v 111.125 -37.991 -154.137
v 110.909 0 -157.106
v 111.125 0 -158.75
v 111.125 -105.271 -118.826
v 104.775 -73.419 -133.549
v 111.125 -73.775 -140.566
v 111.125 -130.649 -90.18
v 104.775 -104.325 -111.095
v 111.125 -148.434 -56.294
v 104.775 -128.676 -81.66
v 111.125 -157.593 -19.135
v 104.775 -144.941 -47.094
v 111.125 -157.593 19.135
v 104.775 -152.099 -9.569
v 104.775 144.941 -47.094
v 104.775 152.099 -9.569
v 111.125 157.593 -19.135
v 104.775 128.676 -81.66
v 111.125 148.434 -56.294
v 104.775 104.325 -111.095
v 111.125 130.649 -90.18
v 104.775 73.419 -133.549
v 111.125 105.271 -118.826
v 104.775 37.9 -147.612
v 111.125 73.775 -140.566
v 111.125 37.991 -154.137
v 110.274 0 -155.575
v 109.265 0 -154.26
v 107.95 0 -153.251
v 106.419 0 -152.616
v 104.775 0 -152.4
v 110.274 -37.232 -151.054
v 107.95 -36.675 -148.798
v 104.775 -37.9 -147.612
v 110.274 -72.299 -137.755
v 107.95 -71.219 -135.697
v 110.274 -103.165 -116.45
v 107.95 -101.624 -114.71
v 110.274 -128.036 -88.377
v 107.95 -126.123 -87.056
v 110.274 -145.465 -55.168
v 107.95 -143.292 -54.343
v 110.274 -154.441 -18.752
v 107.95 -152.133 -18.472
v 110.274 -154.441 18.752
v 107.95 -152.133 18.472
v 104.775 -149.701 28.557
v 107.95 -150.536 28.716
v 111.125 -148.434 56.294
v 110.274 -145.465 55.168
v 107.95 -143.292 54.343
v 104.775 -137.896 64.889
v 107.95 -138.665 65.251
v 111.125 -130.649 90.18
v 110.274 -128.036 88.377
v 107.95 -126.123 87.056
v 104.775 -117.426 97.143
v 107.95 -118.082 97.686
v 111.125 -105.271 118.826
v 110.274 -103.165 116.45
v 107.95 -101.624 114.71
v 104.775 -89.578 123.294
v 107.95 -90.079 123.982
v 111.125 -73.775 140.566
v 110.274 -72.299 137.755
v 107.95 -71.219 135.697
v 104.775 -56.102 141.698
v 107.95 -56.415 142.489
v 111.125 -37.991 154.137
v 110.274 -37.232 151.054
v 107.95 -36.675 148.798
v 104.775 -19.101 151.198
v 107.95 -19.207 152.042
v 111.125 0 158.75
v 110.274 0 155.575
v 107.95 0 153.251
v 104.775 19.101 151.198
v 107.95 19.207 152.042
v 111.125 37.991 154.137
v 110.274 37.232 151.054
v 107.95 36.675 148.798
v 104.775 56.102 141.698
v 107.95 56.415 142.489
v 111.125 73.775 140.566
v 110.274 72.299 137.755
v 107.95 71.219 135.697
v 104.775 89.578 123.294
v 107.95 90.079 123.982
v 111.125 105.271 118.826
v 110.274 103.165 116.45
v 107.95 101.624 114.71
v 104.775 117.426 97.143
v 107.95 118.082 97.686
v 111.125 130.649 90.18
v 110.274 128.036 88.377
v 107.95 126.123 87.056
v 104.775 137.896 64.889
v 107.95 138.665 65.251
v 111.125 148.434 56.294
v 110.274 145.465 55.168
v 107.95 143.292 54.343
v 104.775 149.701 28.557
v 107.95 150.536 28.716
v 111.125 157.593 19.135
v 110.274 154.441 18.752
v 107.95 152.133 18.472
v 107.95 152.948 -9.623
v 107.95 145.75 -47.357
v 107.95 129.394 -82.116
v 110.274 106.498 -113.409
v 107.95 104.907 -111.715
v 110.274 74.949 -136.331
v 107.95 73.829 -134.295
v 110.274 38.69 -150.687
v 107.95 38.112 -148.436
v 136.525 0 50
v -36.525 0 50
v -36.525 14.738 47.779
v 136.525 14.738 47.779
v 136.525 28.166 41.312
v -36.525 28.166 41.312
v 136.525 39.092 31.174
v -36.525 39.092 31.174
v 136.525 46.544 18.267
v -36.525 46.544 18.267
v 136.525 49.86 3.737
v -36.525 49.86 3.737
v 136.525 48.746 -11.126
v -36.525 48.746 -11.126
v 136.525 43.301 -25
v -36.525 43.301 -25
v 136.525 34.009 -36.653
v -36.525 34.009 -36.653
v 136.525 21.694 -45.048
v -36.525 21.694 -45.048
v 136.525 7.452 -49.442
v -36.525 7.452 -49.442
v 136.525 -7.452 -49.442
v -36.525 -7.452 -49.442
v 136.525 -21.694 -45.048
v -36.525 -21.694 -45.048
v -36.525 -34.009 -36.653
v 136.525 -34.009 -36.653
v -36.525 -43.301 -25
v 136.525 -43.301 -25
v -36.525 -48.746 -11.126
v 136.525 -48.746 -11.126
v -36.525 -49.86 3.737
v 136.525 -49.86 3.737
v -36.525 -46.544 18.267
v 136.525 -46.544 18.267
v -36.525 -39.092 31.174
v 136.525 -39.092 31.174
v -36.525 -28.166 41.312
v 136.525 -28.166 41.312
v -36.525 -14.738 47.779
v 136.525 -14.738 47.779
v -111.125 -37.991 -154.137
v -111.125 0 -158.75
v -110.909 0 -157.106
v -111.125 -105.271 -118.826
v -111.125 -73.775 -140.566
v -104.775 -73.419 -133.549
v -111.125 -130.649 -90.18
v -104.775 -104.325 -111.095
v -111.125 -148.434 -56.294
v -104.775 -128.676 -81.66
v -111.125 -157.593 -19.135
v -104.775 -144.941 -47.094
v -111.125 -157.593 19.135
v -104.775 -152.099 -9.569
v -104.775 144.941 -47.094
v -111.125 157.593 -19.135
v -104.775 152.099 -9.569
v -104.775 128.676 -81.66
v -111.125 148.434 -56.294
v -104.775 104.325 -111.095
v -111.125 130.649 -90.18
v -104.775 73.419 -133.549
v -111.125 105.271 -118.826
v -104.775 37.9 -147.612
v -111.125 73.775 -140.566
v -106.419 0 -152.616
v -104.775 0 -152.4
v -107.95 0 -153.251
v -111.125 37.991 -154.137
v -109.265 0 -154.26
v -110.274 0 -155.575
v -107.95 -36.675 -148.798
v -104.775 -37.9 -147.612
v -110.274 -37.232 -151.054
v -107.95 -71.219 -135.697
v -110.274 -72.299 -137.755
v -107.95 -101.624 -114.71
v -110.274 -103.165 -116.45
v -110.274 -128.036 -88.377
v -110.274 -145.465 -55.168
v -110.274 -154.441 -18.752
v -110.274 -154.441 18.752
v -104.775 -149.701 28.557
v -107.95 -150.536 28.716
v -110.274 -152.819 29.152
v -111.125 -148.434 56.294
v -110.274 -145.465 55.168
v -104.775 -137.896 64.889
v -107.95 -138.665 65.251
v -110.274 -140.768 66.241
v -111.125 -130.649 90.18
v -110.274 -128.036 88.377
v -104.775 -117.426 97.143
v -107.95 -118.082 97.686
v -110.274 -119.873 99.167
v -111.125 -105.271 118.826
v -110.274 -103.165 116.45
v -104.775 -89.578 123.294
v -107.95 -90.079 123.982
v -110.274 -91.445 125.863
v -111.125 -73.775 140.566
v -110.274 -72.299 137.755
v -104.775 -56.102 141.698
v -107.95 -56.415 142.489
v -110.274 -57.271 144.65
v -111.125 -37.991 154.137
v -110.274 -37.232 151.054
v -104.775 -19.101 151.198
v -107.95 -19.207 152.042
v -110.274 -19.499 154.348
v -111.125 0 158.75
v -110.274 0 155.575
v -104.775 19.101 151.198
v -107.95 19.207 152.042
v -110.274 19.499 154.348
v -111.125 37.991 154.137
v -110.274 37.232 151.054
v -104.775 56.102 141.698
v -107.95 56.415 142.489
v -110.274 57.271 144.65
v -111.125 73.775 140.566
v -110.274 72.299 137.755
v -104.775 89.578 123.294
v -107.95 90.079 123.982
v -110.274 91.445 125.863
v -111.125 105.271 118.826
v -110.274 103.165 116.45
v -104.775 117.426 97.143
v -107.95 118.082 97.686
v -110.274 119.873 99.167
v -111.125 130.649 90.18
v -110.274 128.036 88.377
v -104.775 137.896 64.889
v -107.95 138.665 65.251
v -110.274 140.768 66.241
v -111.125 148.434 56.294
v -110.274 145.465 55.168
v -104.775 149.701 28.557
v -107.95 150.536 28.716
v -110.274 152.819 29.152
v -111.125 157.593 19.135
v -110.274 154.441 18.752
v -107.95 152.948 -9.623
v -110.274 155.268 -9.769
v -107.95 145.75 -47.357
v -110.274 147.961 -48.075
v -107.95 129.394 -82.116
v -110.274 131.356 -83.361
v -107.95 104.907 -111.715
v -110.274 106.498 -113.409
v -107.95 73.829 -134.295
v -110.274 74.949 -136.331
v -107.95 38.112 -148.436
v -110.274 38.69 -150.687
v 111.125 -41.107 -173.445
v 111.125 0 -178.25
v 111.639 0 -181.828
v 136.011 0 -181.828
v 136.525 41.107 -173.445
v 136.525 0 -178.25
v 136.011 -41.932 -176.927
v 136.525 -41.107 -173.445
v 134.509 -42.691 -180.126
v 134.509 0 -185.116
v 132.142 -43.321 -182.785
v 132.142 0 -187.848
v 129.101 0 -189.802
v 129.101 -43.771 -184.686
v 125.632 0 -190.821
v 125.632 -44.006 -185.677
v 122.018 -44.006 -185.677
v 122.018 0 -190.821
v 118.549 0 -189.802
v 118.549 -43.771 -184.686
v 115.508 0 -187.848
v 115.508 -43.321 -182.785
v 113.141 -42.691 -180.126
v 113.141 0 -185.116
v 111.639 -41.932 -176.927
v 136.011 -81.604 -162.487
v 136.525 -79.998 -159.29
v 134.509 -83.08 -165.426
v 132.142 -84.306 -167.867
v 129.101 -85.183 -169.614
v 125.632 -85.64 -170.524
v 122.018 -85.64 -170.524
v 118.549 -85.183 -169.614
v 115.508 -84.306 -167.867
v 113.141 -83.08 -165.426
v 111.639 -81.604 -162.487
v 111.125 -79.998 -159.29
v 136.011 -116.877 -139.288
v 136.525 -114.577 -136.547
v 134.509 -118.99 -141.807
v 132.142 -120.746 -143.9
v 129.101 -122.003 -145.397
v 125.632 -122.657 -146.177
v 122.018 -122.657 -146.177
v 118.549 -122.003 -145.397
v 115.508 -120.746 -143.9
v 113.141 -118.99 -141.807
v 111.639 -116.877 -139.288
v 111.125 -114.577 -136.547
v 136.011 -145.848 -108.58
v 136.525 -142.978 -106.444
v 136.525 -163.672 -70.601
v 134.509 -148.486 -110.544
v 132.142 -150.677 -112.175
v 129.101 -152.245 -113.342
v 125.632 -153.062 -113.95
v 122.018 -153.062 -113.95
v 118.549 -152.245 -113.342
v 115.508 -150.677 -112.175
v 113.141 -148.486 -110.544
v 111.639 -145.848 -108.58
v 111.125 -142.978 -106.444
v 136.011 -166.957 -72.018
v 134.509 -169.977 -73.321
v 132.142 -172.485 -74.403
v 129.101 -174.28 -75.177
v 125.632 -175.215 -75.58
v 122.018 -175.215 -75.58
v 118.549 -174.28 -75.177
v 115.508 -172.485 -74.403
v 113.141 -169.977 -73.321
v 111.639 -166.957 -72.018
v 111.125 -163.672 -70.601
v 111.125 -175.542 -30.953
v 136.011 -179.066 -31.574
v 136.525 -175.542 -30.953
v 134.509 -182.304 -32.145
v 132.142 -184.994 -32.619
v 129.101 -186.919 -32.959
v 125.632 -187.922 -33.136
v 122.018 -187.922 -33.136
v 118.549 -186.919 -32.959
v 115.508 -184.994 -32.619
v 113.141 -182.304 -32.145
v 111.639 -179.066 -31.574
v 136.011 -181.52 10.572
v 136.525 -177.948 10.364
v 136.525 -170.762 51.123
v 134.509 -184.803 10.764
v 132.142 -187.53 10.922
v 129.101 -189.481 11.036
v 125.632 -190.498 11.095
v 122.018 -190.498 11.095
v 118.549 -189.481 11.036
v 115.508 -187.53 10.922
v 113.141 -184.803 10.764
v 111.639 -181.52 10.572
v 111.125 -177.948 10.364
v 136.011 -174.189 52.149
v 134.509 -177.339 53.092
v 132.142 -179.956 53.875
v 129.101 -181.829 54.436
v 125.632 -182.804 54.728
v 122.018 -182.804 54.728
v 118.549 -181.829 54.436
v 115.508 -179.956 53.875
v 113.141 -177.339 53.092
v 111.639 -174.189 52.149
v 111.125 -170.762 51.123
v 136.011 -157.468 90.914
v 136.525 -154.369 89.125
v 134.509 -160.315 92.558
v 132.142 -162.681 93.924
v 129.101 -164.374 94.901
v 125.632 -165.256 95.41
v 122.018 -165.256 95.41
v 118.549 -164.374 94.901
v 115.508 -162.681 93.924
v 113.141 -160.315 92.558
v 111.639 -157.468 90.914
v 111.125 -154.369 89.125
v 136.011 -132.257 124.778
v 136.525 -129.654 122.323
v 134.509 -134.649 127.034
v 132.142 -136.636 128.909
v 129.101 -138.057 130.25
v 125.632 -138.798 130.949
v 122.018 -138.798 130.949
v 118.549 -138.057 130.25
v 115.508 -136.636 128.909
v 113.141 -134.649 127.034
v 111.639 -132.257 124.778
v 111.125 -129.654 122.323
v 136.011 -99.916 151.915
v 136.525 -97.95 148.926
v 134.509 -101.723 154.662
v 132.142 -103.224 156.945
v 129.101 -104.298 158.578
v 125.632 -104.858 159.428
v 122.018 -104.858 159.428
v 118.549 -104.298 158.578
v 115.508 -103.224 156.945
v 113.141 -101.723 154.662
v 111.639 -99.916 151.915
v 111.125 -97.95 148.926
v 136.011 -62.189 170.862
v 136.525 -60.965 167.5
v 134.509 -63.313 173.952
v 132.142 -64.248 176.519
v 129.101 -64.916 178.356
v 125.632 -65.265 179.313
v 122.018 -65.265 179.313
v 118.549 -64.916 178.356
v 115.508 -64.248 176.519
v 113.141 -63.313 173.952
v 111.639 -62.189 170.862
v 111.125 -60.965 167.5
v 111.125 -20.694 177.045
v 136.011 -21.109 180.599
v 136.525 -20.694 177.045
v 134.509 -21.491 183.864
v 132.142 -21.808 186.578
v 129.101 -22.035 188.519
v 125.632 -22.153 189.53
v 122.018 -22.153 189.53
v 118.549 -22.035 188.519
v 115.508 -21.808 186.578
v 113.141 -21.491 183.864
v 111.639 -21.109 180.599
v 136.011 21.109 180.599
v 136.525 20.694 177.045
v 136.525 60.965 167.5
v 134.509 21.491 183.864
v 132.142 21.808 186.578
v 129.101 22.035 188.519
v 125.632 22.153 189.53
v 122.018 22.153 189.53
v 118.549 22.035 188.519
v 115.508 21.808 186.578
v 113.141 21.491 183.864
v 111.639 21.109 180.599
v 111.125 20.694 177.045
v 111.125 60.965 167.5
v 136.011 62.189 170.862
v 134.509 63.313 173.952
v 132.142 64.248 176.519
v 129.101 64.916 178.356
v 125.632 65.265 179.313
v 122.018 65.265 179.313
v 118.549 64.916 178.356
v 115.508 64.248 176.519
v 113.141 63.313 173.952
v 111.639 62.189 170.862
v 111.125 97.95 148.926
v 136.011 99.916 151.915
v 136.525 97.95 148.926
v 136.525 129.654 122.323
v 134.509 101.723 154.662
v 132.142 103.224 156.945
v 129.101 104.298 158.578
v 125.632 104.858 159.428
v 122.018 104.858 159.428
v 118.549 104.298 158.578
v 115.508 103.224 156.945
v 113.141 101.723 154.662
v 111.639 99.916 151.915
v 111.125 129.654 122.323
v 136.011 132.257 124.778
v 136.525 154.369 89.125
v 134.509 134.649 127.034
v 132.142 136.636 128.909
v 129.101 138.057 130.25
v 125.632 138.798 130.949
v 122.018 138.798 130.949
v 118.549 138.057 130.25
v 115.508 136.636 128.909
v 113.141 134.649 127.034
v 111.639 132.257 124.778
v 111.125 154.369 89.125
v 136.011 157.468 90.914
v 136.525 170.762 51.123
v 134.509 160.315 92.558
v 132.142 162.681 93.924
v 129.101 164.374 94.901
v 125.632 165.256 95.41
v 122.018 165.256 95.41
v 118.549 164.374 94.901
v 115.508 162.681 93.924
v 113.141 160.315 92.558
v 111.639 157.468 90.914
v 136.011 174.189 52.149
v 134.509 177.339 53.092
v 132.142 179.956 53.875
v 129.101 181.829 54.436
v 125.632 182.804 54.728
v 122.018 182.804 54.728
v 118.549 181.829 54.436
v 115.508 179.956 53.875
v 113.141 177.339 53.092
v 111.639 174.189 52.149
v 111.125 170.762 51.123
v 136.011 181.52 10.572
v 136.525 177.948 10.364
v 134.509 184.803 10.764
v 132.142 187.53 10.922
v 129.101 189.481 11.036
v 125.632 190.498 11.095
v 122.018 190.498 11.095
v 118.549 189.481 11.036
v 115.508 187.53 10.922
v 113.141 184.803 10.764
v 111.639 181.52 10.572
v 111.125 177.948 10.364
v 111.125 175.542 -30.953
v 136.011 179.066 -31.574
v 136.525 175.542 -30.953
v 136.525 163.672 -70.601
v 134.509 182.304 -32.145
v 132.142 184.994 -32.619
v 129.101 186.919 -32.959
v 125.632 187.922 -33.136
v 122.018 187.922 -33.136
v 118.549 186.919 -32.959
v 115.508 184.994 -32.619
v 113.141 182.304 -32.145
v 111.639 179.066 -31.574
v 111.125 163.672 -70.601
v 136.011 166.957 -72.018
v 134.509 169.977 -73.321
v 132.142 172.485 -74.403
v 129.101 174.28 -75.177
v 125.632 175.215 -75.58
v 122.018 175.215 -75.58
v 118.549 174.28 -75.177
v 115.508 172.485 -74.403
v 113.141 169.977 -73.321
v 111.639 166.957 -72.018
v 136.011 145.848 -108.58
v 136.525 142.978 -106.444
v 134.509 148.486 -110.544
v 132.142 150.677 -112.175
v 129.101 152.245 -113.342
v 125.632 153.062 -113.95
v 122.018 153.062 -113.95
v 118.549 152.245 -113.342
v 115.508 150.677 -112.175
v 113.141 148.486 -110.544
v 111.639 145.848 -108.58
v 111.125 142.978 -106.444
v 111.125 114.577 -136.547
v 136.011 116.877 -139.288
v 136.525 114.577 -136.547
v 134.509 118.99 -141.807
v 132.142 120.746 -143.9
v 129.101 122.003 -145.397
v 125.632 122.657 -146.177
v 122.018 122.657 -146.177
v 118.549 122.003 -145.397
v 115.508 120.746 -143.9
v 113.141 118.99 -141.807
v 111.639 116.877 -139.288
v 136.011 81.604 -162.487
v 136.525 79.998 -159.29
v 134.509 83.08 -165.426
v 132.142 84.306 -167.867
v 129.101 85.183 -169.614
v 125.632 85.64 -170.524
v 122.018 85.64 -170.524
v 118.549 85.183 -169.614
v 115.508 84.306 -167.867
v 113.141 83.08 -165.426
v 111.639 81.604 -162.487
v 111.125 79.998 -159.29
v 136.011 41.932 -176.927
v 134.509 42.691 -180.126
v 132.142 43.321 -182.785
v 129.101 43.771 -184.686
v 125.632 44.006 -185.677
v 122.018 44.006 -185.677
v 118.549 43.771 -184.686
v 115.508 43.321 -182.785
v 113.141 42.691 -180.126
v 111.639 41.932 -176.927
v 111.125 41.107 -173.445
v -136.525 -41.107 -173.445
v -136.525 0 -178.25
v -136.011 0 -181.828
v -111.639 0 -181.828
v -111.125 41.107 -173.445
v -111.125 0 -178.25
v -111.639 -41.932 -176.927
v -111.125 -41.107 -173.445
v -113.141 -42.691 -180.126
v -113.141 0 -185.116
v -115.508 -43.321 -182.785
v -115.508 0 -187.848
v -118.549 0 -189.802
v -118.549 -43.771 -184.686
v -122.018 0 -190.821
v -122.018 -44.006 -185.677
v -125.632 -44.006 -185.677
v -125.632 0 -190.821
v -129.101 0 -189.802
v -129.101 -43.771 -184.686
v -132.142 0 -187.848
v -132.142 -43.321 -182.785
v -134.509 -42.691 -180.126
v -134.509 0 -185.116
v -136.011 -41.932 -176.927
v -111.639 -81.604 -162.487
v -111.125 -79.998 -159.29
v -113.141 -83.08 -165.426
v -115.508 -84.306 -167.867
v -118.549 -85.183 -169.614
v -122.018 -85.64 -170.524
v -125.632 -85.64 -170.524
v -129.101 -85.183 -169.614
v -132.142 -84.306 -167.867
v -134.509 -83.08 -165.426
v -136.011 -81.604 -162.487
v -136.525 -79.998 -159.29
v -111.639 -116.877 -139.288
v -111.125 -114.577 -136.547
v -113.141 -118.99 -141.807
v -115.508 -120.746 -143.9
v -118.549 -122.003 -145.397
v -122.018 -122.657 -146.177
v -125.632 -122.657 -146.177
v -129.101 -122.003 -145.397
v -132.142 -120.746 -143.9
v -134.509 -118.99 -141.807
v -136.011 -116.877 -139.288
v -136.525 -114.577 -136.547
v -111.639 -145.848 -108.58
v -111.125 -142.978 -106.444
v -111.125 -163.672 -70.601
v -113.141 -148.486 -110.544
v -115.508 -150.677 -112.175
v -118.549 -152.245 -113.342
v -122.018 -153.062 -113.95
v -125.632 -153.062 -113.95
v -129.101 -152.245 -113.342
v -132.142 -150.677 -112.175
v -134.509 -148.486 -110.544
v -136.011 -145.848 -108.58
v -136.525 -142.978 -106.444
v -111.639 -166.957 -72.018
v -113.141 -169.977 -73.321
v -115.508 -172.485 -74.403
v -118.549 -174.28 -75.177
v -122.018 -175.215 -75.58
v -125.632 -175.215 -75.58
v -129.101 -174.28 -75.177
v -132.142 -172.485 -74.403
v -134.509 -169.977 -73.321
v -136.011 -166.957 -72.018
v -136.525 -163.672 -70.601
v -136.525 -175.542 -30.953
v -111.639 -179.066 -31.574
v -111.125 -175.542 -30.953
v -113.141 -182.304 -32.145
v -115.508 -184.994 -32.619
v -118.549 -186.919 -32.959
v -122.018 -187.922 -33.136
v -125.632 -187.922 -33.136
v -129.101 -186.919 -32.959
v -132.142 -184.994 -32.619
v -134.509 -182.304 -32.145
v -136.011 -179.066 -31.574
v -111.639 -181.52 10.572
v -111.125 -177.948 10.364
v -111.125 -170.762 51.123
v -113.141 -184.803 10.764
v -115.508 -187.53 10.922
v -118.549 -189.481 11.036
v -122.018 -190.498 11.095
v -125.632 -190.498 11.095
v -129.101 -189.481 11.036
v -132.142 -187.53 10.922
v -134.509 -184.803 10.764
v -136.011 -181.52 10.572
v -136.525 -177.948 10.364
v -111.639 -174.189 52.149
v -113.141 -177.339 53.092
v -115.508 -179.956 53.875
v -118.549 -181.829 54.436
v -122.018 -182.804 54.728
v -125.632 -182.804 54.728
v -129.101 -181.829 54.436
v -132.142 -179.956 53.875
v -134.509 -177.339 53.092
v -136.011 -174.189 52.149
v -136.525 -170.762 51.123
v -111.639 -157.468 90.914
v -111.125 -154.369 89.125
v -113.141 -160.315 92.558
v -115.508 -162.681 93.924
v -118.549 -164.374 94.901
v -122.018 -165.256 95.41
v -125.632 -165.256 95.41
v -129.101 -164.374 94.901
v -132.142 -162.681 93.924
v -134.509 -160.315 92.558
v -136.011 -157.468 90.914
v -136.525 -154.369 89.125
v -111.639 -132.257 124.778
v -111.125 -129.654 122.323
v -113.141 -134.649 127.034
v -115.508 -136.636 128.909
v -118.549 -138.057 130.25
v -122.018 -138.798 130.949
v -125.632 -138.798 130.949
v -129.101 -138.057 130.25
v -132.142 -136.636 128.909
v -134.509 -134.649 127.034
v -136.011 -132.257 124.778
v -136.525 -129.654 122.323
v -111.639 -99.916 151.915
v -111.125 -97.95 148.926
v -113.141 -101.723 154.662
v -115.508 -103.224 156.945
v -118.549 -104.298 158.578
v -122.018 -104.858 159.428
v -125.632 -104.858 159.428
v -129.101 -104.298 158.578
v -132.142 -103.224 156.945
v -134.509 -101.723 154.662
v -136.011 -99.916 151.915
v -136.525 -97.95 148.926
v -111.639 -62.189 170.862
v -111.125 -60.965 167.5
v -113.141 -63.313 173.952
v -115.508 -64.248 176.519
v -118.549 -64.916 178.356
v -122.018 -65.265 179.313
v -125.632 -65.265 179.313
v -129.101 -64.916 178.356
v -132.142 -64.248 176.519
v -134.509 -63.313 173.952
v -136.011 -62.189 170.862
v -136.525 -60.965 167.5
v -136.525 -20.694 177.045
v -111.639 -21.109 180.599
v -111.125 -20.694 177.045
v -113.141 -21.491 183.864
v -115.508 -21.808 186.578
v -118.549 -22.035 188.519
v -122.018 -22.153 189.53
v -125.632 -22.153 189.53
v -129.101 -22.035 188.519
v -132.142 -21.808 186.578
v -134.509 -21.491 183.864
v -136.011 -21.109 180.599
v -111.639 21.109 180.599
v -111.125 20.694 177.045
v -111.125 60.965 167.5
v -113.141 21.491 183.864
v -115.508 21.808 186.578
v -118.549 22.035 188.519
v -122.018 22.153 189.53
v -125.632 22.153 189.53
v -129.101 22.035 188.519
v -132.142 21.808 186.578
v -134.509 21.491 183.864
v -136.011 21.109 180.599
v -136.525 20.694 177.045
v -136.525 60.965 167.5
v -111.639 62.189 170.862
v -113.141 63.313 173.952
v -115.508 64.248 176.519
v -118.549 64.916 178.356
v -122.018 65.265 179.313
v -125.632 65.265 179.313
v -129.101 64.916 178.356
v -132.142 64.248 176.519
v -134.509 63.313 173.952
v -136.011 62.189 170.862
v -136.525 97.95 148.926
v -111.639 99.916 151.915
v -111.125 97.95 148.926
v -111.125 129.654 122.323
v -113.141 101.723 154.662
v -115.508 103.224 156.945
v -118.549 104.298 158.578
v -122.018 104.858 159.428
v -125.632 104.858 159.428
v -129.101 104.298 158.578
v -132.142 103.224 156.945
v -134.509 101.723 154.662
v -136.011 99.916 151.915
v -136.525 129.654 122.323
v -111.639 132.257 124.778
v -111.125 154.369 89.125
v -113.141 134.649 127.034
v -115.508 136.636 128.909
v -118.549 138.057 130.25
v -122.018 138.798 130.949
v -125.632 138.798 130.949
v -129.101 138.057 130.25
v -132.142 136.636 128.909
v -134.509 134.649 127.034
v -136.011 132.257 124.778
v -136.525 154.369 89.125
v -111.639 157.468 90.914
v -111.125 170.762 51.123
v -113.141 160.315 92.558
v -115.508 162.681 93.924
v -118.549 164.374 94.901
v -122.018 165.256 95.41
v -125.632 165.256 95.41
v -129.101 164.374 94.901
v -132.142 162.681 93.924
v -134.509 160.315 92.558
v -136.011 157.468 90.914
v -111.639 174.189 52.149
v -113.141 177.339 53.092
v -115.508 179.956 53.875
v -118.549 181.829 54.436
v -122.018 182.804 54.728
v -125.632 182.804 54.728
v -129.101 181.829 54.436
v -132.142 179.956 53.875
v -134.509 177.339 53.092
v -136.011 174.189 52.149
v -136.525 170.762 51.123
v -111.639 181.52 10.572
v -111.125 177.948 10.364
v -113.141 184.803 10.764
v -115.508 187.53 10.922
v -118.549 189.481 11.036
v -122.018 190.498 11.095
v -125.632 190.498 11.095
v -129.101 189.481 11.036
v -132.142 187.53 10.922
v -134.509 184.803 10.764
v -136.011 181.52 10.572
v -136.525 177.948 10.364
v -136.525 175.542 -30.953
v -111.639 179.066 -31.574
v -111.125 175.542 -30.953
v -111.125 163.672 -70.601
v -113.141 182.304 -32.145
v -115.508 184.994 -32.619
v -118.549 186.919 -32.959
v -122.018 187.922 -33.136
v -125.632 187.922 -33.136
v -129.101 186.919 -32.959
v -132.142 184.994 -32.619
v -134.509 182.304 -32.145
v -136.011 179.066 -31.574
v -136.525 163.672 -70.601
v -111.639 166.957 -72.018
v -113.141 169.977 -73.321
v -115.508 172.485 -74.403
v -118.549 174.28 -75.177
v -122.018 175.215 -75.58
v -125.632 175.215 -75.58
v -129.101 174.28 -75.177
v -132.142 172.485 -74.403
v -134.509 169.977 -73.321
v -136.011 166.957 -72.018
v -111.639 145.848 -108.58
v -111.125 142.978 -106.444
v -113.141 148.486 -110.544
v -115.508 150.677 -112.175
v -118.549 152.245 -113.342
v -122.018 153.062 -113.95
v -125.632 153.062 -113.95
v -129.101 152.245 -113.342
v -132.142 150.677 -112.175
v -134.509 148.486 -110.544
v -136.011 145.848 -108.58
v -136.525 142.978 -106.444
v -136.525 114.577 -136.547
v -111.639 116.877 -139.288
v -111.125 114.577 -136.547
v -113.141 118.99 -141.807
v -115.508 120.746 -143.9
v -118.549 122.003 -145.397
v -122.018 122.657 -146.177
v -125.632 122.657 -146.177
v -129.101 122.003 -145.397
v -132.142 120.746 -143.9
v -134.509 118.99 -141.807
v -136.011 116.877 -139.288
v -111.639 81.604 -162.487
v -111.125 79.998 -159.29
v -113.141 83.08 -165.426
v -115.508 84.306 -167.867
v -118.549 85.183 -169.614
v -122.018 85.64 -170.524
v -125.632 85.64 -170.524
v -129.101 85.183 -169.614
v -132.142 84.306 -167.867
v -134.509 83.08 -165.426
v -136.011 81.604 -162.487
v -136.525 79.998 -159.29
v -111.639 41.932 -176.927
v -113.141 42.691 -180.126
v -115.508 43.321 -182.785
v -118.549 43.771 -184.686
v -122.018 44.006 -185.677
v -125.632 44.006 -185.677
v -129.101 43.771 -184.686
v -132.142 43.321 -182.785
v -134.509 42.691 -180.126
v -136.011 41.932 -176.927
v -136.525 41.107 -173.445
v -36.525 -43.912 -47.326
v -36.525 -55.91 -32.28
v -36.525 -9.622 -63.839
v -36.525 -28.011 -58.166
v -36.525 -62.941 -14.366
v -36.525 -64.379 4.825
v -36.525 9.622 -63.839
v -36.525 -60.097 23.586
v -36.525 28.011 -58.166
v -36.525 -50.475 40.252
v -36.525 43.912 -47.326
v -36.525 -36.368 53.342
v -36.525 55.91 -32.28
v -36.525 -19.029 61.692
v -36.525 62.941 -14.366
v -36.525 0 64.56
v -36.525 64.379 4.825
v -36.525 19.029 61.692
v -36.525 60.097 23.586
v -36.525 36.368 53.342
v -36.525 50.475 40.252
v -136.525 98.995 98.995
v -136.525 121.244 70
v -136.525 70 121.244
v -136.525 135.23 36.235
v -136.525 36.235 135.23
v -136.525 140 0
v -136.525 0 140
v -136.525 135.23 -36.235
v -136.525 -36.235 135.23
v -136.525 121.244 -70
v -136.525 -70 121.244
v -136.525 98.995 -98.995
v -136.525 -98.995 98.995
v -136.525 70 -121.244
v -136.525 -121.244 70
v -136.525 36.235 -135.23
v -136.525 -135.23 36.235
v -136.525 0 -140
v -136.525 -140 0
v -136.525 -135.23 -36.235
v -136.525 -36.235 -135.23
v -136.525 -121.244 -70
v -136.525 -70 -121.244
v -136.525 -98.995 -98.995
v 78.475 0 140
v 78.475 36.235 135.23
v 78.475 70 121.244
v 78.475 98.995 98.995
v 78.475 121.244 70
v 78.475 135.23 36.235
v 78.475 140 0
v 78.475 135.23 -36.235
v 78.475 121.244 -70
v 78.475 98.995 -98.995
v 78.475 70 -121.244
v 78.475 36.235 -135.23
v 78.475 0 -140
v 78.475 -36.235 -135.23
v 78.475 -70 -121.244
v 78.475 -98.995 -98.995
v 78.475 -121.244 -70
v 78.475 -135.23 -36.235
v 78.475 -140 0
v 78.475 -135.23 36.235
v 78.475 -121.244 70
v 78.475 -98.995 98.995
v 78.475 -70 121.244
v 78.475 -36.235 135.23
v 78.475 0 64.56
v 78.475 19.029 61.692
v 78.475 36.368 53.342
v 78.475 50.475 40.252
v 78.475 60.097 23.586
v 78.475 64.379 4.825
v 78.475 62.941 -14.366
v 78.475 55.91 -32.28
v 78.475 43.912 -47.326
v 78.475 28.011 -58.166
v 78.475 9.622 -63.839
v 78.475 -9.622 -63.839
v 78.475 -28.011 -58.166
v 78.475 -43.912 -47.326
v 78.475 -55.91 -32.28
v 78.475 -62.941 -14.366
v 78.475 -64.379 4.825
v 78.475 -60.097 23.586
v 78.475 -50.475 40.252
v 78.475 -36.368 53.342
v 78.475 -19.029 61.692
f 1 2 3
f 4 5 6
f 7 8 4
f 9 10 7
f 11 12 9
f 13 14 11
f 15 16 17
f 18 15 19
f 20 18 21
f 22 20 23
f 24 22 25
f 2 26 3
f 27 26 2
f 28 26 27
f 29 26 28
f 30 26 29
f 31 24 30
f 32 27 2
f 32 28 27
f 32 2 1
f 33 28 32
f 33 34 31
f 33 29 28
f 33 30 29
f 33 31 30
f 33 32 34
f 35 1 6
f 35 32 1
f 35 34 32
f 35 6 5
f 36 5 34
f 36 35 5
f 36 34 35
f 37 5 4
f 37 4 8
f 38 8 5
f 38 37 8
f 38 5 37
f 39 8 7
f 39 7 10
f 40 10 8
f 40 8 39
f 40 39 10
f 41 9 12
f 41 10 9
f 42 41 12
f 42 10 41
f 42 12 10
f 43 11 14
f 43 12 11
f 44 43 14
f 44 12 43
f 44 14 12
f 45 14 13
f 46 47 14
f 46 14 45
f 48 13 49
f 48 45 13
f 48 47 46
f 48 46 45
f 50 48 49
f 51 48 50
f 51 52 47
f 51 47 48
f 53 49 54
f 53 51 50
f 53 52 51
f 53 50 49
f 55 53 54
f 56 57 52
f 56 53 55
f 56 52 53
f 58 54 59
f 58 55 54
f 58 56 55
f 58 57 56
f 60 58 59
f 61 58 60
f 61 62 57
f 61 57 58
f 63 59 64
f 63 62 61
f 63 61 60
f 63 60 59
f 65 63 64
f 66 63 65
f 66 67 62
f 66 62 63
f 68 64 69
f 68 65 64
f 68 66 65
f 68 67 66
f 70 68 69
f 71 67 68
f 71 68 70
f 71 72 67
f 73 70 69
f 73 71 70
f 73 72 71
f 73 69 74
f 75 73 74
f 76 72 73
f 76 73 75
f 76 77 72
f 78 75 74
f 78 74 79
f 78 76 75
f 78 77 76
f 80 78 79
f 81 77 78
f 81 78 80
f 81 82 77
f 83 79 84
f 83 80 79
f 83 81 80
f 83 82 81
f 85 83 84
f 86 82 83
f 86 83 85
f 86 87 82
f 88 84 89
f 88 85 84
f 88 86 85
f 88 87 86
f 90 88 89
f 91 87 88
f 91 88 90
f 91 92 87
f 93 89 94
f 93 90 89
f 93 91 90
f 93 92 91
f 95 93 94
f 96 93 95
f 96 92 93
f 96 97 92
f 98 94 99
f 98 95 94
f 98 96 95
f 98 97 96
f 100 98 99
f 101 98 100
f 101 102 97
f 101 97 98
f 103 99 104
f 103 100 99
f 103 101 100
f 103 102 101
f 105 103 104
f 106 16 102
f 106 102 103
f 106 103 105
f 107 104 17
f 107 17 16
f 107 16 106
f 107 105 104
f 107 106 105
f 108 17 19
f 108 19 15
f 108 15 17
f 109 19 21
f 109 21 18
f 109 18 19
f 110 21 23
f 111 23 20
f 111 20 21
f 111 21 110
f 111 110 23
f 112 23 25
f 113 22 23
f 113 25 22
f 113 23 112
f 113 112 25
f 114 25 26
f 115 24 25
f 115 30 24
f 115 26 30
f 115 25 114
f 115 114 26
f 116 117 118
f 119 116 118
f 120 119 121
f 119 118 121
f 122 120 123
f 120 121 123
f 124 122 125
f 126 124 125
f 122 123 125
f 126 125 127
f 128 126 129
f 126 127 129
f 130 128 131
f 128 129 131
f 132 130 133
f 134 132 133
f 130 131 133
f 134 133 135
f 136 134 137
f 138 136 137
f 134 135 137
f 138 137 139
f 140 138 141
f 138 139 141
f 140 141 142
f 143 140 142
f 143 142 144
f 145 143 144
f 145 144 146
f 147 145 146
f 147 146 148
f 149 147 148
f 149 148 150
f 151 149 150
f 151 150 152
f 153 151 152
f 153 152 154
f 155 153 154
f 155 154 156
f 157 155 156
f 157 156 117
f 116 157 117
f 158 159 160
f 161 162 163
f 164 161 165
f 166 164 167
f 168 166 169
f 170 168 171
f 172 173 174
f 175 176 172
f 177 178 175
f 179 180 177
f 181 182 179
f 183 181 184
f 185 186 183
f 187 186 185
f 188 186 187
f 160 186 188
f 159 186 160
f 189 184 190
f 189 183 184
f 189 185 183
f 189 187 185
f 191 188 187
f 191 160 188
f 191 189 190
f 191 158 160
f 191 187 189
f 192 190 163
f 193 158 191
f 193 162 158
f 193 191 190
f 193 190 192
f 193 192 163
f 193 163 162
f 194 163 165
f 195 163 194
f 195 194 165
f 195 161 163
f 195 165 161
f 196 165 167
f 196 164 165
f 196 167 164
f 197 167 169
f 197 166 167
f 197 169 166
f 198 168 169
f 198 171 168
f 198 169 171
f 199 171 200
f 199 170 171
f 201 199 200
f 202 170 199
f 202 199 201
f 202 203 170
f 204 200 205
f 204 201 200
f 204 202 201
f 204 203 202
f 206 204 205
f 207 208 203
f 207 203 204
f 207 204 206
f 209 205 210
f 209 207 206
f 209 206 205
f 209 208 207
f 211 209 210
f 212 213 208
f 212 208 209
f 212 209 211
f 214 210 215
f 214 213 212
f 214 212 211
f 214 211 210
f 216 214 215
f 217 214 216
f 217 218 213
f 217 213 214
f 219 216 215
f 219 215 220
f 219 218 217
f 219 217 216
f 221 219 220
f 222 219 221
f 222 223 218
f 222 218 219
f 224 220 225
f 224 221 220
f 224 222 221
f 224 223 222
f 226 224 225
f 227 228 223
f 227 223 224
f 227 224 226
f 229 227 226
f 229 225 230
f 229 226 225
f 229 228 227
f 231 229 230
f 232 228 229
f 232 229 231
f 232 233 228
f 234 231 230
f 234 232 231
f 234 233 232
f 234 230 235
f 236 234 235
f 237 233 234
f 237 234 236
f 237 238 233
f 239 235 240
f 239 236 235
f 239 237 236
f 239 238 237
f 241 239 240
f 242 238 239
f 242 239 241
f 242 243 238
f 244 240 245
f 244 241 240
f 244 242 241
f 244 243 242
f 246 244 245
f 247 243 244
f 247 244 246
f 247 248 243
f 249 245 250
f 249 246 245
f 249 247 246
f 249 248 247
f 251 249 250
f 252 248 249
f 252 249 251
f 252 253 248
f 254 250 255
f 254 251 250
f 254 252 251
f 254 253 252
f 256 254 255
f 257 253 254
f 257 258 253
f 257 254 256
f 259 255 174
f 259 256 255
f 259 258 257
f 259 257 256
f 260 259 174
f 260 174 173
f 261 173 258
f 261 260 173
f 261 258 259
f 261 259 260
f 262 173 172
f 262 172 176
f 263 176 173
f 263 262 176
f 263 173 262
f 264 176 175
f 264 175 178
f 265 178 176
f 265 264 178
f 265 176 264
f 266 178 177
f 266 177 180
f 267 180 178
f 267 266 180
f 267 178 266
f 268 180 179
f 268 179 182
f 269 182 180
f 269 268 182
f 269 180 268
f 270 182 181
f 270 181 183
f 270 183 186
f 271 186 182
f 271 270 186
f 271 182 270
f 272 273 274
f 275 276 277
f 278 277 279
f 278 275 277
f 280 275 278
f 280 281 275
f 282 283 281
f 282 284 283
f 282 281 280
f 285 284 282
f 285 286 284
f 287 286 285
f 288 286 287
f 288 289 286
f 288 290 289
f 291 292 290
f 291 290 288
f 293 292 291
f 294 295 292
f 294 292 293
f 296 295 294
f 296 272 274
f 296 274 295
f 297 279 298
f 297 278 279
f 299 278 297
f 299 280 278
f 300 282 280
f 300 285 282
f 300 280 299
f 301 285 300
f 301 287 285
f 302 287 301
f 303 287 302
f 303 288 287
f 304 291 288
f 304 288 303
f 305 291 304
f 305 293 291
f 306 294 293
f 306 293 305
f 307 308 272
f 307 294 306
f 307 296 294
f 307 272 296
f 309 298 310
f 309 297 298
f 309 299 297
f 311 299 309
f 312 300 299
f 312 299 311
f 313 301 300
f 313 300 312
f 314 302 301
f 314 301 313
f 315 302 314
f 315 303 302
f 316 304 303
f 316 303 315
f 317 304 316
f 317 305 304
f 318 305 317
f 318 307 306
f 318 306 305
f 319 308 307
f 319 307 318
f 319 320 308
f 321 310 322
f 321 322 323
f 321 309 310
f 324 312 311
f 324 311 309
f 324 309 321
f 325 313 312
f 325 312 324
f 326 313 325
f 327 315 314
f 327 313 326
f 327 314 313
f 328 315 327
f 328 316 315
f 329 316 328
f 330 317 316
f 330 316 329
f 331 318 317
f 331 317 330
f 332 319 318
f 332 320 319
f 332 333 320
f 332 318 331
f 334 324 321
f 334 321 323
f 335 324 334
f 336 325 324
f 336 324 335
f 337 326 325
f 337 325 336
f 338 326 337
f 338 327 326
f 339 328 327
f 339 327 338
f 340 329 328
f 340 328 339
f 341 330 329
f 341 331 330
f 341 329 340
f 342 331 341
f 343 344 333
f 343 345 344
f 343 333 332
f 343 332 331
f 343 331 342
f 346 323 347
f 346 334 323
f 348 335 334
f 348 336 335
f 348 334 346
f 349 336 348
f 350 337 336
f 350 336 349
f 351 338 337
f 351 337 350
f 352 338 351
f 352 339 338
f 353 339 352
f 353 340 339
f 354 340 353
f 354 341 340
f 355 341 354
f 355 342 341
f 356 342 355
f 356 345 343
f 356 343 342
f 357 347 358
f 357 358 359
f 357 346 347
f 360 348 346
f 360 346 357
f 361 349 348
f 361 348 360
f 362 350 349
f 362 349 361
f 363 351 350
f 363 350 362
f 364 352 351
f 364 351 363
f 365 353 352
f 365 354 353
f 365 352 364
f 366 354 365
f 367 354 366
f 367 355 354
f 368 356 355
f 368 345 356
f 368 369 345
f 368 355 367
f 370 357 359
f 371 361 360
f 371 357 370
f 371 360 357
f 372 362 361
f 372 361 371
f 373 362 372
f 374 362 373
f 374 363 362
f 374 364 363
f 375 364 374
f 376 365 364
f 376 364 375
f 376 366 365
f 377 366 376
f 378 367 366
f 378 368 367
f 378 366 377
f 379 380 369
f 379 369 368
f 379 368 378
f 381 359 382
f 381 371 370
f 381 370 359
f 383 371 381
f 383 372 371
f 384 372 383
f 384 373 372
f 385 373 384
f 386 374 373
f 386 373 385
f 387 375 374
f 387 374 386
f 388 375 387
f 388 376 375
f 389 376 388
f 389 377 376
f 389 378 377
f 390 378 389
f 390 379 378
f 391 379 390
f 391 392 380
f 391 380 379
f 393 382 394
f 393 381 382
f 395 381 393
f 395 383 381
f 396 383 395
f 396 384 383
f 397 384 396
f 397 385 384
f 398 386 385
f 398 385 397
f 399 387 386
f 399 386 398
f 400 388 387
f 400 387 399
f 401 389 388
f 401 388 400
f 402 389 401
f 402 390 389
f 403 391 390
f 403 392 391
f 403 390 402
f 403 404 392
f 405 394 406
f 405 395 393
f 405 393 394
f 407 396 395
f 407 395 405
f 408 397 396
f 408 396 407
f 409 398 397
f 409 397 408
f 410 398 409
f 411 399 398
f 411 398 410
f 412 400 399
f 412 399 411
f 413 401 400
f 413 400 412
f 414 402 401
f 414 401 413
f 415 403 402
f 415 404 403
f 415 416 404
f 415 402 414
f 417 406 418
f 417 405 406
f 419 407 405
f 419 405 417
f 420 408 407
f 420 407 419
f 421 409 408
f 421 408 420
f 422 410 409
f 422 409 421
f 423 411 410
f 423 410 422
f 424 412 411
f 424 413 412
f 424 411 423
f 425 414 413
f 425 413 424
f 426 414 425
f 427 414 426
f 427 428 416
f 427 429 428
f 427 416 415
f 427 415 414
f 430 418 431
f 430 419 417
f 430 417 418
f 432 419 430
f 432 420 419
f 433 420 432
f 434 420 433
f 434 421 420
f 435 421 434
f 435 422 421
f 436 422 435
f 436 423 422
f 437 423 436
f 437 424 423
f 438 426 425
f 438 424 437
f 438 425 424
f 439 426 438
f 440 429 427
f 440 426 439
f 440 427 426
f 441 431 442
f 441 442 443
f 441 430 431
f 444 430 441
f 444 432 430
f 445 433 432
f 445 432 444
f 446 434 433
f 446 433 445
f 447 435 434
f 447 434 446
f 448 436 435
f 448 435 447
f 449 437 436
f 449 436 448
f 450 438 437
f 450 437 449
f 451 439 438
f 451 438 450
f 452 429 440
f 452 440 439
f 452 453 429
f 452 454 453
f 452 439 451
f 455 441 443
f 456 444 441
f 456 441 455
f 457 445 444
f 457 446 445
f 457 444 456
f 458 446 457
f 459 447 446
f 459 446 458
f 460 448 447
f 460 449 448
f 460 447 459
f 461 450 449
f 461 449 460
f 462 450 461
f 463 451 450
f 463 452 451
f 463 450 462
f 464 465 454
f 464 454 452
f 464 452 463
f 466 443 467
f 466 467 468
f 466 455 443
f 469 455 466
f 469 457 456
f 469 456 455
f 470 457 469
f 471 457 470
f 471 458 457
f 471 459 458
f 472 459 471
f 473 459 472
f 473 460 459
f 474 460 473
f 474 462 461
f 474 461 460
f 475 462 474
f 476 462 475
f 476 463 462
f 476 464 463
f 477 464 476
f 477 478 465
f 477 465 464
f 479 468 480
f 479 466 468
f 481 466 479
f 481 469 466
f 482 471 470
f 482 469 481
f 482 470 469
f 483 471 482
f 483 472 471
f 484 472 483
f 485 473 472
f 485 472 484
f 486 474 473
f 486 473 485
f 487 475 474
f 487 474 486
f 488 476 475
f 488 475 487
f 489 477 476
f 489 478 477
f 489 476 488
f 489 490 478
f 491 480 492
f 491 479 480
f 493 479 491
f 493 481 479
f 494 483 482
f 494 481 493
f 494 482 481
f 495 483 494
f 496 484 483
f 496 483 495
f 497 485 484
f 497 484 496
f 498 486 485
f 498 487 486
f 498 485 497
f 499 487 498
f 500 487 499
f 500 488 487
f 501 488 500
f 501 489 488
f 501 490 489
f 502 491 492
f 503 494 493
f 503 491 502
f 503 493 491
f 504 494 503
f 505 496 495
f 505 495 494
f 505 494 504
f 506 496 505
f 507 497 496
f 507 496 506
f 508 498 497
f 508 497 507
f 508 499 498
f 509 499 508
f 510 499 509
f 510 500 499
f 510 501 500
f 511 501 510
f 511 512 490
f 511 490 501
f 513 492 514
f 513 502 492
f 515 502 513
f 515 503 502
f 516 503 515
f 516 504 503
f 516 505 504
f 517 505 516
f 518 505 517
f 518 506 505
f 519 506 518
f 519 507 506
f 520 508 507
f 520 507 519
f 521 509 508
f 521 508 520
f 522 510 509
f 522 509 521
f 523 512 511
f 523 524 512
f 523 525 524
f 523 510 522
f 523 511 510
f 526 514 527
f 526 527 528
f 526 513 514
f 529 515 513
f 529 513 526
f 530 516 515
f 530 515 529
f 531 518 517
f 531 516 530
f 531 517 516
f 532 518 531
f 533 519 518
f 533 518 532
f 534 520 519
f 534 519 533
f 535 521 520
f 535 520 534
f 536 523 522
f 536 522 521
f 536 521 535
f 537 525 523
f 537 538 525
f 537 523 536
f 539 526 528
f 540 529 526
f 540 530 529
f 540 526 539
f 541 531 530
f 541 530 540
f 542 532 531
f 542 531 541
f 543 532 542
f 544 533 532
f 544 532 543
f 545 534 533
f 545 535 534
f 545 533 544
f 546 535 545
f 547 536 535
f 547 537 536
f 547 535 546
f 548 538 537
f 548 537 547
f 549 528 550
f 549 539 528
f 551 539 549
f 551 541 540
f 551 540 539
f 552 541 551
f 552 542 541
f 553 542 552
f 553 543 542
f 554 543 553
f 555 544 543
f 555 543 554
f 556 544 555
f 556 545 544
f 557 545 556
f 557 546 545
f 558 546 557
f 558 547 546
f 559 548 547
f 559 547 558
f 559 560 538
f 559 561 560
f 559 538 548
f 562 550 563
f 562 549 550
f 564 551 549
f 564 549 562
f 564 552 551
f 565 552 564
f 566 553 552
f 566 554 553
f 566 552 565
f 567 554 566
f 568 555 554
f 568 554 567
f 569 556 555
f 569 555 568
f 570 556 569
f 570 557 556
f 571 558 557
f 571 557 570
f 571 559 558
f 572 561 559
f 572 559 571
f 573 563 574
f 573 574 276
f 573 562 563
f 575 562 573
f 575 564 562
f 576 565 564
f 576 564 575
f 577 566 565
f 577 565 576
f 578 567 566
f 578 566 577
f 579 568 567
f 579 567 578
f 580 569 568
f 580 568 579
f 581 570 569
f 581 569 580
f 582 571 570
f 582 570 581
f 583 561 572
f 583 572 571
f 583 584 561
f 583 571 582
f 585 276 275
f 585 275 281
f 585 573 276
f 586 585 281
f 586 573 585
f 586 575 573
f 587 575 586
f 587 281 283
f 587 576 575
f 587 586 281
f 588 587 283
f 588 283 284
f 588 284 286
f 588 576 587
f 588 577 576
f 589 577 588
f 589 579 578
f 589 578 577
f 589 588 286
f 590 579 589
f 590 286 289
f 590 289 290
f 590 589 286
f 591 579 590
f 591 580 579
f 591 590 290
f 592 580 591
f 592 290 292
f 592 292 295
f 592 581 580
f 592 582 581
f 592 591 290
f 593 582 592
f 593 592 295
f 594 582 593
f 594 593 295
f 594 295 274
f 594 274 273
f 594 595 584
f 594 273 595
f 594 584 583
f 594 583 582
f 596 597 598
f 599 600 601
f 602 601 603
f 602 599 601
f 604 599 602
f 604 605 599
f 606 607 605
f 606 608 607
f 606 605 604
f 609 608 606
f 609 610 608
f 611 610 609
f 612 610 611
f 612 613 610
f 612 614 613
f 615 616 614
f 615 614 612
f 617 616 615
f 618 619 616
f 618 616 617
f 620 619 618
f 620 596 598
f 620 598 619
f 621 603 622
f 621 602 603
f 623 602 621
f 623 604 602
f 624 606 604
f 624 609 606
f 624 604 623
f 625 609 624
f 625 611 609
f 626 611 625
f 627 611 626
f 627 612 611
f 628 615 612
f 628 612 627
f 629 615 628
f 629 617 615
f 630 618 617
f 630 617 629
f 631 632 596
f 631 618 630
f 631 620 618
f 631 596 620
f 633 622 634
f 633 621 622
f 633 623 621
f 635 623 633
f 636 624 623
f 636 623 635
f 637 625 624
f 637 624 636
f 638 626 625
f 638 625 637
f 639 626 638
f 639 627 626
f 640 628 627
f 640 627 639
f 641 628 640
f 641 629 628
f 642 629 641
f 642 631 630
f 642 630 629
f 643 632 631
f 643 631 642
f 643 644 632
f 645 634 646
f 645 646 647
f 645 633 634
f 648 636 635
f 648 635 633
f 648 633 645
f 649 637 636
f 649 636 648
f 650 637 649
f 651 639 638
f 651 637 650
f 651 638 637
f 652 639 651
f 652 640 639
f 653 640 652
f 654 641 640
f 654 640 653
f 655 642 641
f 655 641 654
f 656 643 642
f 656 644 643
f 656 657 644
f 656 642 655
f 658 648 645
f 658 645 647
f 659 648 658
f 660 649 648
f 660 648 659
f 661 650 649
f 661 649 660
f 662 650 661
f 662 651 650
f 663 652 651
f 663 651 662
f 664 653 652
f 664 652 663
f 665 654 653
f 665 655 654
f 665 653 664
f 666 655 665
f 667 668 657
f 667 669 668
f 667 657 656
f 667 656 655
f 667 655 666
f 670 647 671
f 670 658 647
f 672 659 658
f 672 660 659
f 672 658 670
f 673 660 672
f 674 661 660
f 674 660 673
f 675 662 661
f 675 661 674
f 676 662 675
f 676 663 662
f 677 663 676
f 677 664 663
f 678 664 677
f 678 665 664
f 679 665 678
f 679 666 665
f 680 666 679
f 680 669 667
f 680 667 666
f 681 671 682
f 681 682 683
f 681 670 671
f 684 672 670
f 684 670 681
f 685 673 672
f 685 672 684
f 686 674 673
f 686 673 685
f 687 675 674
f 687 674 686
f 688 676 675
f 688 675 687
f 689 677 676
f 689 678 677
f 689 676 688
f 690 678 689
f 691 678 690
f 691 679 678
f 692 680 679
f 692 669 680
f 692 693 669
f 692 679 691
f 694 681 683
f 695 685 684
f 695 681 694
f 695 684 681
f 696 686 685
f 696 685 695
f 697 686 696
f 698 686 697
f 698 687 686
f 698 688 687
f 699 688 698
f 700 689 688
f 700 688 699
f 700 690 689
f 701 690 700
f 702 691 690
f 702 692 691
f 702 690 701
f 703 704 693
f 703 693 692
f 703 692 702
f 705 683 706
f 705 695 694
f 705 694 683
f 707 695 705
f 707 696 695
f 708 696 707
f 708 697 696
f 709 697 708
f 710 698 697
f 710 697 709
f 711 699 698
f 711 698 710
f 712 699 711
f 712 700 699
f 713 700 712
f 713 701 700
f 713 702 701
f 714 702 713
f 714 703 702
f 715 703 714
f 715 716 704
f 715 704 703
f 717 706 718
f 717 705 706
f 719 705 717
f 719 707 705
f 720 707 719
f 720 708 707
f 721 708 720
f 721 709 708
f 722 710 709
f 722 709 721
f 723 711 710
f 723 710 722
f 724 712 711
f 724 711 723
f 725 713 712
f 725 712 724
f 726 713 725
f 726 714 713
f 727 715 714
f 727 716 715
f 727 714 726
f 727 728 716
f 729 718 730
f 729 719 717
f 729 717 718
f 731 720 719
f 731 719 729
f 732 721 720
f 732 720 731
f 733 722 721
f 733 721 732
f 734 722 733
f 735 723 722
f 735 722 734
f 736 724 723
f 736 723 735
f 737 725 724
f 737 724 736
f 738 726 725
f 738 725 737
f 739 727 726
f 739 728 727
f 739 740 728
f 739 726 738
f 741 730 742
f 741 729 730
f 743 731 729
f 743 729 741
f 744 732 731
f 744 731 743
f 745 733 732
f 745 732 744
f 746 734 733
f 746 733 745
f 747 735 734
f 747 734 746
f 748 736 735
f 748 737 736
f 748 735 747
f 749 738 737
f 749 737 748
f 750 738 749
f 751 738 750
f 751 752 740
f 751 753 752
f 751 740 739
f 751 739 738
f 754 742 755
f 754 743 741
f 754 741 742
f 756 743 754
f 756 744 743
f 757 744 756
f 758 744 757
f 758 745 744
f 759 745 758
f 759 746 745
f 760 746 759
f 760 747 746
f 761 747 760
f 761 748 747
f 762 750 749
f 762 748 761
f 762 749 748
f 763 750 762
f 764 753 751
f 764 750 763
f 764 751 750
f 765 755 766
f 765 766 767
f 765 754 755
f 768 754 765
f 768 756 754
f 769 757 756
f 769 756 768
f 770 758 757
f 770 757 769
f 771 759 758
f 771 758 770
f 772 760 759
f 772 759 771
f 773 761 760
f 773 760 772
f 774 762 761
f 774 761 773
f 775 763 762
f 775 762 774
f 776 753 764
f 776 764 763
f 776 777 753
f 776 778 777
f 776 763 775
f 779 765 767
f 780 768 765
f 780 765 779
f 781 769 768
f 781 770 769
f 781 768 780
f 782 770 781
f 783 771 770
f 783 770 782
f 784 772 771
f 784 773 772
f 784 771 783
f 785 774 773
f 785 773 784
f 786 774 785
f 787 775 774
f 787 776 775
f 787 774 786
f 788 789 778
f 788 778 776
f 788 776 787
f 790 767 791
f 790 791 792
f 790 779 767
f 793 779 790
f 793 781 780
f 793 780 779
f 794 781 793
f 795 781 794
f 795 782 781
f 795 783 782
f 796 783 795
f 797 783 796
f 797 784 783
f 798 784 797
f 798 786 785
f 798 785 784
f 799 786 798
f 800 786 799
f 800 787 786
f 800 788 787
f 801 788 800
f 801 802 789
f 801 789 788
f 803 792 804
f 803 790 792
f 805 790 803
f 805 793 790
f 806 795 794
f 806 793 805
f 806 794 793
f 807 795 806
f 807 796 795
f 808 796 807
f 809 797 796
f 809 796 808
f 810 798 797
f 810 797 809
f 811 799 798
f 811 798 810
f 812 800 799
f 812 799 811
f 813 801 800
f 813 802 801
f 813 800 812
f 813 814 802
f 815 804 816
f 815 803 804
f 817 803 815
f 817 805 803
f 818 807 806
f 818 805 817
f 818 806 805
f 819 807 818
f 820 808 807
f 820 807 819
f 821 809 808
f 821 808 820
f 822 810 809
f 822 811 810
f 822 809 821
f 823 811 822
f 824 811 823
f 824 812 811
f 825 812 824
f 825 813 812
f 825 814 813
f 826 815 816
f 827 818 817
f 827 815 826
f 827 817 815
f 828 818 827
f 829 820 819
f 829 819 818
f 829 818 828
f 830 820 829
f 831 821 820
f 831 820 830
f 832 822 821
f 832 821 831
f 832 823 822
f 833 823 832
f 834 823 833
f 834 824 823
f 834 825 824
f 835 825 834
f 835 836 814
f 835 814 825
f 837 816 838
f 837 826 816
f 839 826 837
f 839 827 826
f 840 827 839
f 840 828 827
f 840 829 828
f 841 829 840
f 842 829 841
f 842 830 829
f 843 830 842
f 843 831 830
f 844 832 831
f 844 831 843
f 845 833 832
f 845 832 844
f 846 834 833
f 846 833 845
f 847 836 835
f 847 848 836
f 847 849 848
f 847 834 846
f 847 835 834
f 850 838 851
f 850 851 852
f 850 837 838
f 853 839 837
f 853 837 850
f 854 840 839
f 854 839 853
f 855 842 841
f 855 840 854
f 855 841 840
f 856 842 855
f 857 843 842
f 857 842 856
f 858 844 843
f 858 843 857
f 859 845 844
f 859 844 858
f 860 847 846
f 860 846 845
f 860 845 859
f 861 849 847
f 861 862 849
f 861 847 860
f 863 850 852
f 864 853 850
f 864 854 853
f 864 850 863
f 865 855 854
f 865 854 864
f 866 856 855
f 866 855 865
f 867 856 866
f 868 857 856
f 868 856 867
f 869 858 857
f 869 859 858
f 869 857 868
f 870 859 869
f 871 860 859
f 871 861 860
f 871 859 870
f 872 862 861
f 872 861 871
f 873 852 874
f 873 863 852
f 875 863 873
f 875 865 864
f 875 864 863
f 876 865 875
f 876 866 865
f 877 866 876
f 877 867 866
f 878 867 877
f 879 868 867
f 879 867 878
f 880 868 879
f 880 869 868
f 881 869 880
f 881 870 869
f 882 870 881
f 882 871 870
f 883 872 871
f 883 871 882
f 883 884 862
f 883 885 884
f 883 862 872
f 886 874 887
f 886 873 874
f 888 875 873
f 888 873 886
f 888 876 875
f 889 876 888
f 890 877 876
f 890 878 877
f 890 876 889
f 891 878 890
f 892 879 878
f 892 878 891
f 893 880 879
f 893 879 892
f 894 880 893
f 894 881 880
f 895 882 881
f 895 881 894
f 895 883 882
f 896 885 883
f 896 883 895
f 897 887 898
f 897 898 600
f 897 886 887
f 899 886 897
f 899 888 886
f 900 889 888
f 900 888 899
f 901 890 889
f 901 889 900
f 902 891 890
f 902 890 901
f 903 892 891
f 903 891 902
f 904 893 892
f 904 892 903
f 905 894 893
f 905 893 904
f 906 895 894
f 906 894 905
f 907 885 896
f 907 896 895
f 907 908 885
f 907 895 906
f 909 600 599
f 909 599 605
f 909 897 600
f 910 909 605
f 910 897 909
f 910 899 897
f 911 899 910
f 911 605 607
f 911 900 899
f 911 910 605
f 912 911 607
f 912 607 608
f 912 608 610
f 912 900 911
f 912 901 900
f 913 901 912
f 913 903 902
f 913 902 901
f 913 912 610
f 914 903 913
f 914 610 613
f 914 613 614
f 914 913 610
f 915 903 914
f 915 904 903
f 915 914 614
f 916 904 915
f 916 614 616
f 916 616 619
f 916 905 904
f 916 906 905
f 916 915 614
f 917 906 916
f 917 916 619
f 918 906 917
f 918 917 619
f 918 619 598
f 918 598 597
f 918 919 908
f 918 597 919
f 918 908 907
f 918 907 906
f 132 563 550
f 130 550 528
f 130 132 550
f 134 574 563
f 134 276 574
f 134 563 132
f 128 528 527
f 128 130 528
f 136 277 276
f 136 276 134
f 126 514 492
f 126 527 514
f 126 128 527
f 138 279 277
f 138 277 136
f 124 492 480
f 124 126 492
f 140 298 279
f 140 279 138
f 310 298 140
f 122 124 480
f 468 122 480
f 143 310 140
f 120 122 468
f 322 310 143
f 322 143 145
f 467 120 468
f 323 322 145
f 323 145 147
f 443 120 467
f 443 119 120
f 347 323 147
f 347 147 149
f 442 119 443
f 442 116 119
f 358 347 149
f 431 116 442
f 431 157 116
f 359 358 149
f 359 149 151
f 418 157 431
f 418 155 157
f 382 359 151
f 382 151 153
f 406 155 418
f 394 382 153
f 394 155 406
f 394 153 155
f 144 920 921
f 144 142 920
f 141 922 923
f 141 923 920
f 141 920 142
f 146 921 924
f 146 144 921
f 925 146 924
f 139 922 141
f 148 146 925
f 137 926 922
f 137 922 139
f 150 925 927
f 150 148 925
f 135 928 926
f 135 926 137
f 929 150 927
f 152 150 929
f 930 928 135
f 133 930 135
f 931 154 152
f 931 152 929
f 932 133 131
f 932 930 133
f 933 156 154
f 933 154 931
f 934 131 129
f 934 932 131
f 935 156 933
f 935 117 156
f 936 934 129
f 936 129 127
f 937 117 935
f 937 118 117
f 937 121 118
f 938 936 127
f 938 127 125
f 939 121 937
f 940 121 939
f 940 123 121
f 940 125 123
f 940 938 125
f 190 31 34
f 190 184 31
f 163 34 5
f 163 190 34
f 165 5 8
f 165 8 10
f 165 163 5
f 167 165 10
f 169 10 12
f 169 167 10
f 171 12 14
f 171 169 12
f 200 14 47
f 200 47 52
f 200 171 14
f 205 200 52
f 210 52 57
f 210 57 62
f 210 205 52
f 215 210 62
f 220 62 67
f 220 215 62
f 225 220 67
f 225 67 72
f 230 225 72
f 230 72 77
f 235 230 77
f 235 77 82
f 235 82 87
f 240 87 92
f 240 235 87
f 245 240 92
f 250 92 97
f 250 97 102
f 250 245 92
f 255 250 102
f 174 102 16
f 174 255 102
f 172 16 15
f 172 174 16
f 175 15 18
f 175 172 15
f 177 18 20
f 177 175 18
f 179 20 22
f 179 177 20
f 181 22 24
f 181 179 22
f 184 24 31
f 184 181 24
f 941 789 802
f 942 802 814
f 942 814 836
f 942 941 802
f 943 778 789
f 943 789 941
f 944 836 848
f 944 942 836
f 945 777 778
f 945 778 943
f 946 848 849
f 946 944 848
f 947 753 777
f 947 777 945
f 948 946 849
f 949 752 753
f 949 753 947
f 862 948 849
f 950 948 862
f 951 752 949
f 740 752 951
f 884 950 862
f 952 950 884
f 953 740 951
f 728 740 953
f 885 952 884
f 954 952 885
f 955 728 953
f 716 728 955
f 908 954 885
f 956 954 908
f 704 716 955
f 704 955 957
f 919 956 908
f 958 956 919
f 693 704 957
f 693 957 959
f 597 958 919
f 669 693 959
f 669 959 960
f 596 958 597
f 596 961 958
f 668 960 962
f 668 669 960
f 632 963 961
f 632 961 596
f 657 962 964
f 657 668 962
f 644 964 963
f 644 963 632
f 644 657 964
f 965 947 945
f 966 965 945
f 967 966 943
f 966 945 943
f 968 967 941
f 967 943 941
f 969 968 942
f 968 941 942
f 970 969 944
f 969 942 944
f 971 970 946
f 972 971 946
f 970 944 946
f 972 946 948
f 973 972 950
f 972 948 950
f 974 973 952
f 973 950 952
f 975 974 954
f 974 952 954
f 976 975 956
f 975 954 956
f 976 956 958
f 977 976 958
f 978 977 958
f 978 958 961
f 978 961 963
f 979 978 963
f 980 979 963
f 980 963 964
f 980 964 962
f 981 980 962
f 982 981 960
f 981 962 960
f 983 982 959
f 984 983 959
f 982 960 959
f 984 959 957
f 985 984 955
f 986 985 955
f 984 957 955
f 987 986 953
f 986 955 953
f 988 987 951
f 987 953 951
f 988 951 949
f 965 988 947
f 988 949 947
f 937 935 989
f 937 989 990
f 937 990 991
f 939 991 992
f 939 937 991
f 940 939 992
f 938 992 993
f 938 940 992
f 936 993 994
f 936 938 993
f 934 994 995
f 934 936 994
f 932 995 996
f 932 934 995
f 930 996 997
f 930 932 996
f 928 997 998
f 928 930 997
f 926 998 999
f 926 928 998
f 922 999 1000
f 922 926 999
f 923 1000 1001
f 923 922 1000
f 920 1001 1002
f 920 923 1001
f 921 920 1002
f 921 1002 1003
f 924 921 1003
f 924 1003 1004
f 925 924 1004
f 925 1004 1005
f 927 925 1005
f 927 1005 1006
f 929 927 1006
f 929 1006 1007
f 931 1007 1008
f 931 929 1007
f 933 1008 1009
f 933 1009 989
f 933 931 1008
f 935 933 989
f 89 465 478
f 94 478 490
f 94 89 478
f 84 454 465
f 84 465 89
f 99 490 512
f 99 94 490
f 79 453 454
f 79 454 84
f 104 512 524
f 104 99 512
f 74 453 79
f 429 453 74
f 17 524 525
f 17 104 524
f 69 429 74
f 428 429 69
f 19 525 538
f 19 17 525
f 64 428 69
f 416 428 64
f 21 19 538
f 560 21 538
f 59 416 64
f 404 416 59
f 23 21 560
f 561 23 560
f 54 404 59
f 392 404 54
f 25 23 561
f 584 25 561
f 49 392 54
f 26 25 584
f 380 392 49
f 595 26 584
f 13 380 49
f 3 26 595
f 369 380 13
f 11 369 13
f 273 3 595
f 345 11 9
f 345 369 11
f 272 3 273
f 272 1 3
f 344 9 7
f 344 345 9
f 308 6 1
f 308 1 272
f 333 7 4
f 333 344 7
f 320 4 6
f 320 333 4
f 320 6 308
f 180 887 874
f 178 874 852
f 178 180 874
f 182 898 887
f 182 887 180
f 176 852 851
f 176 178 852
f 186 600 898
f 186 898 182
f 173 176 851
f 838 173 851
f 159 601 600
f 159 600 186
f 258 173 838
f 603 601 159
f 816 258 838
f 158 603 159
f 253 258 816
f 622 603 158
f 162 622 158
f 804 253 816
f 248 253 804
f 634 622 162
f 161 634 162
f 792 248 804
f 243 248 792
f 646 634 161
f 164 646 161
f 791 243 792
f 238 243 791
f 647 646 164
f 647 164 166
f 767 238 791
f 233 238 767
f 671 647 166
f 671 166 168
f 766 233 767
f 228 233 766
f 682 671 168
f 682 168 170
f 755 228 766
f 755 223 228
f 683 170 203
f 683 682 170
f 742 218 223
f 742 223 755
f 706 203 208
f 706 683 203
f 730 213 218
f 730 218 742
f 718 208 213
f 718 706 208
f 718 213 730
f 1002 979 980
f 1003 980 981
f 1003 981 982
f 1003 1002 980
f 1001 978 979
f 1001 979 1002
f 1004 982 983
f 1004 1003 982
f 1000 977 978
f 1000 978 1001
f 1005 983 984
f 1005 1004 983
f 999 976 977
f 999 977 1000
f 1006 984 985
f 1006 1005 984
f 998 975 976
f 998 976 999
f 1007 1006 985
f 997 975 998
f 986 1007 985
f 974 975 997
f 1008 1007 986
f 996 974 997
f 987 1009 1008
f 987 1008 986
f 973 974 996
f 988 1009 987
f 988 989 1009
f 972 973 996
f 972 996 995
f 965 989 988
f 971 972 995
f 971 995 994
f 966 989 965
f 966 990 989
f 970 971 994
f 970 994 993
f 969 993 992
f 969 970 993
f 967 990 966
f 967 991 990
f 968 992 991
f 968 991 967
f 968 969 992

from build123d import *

# Parameters (mm, degrees)
SKETCH2_R           = 50
CUT_EXTRUDE1_DEPTH  = 385.031388791
SKETCH3_R           = 140
CUT_EXTRUDE3_DEPTH  = 215
BOSS_EXTRUDE1_START = 115
SKETCH5_R           = 64.559730184
SKETCH5_R_2         = 50
BOSS_EXTRUDE1_DEPTH = 115


with BuildPart() as part:
    # Sketch1 → Revolve1 (revolve)
    with BuildSketch(Plane.XY):
        with BuildLine():
            Line((104.775, 152.4), (-104.775, 152.4))
            ThreePointArc((-104.775, 152.4), (-109.265128061, 154.259871939), (-111.125, 158.75))
            Line((-111.125, 158.75), (-111.125, 178.25))
            ThreePointArc((-111.125, 178.25), (-123.825, 190.95), (-136.525, 178.25))
            Line((-136.525, 178.25), (-136.525, 0))
            Line((-136.525, 0), (136.525, 0))
            Line((136.525, 0), (136.525, 178.25))
            ThreePointArc((136.525, 178.25), (123.825, 190.95), (111.125, 178.25))
            Line((111.125, 178.25), (111.125, 158.75))
            ThreePointArc((111.125, 158.75), (109.265128061, 154.259871939), (104.775, 152.4))
        make_face()
    revolve(axis=Axis((0, 0, 0), (-1, 0, 0)))

    # Sketch2 → Cut-Extrude1 (cut, through all)
    with BuildSketch(Plane.ZY.offset(136.525)):
        Circle(SKETCH2_R)
    extrude(amount=-CUT_EXTRUDE1_DEPTH, mode=Mode.SUBTRACT)

    # Sketch3 → Cut-Extrude3 (cut)
    with BuildSketch(Plane.ZY.offset(136.525)):
        Circle(SKETCH3_R)
    extrude(amount=-CUT_EXTRUDE3_DEPTH, mode=Mode.SUBTRACT)

    # Sketch5 → Boss-Extrude1 (add)
    with BuildSketch(Plane.ZY.offset(-78.475).offset(BOSS_EXTRUDE1_START)):
        Circle(SKETCH5_R)
        Circle(SKETCH5_R_2, mode=Mode.SUBTRACT)
    extrude(amount=-BOSS_EXTRUDE1_DEPTH)


solid = part.part
